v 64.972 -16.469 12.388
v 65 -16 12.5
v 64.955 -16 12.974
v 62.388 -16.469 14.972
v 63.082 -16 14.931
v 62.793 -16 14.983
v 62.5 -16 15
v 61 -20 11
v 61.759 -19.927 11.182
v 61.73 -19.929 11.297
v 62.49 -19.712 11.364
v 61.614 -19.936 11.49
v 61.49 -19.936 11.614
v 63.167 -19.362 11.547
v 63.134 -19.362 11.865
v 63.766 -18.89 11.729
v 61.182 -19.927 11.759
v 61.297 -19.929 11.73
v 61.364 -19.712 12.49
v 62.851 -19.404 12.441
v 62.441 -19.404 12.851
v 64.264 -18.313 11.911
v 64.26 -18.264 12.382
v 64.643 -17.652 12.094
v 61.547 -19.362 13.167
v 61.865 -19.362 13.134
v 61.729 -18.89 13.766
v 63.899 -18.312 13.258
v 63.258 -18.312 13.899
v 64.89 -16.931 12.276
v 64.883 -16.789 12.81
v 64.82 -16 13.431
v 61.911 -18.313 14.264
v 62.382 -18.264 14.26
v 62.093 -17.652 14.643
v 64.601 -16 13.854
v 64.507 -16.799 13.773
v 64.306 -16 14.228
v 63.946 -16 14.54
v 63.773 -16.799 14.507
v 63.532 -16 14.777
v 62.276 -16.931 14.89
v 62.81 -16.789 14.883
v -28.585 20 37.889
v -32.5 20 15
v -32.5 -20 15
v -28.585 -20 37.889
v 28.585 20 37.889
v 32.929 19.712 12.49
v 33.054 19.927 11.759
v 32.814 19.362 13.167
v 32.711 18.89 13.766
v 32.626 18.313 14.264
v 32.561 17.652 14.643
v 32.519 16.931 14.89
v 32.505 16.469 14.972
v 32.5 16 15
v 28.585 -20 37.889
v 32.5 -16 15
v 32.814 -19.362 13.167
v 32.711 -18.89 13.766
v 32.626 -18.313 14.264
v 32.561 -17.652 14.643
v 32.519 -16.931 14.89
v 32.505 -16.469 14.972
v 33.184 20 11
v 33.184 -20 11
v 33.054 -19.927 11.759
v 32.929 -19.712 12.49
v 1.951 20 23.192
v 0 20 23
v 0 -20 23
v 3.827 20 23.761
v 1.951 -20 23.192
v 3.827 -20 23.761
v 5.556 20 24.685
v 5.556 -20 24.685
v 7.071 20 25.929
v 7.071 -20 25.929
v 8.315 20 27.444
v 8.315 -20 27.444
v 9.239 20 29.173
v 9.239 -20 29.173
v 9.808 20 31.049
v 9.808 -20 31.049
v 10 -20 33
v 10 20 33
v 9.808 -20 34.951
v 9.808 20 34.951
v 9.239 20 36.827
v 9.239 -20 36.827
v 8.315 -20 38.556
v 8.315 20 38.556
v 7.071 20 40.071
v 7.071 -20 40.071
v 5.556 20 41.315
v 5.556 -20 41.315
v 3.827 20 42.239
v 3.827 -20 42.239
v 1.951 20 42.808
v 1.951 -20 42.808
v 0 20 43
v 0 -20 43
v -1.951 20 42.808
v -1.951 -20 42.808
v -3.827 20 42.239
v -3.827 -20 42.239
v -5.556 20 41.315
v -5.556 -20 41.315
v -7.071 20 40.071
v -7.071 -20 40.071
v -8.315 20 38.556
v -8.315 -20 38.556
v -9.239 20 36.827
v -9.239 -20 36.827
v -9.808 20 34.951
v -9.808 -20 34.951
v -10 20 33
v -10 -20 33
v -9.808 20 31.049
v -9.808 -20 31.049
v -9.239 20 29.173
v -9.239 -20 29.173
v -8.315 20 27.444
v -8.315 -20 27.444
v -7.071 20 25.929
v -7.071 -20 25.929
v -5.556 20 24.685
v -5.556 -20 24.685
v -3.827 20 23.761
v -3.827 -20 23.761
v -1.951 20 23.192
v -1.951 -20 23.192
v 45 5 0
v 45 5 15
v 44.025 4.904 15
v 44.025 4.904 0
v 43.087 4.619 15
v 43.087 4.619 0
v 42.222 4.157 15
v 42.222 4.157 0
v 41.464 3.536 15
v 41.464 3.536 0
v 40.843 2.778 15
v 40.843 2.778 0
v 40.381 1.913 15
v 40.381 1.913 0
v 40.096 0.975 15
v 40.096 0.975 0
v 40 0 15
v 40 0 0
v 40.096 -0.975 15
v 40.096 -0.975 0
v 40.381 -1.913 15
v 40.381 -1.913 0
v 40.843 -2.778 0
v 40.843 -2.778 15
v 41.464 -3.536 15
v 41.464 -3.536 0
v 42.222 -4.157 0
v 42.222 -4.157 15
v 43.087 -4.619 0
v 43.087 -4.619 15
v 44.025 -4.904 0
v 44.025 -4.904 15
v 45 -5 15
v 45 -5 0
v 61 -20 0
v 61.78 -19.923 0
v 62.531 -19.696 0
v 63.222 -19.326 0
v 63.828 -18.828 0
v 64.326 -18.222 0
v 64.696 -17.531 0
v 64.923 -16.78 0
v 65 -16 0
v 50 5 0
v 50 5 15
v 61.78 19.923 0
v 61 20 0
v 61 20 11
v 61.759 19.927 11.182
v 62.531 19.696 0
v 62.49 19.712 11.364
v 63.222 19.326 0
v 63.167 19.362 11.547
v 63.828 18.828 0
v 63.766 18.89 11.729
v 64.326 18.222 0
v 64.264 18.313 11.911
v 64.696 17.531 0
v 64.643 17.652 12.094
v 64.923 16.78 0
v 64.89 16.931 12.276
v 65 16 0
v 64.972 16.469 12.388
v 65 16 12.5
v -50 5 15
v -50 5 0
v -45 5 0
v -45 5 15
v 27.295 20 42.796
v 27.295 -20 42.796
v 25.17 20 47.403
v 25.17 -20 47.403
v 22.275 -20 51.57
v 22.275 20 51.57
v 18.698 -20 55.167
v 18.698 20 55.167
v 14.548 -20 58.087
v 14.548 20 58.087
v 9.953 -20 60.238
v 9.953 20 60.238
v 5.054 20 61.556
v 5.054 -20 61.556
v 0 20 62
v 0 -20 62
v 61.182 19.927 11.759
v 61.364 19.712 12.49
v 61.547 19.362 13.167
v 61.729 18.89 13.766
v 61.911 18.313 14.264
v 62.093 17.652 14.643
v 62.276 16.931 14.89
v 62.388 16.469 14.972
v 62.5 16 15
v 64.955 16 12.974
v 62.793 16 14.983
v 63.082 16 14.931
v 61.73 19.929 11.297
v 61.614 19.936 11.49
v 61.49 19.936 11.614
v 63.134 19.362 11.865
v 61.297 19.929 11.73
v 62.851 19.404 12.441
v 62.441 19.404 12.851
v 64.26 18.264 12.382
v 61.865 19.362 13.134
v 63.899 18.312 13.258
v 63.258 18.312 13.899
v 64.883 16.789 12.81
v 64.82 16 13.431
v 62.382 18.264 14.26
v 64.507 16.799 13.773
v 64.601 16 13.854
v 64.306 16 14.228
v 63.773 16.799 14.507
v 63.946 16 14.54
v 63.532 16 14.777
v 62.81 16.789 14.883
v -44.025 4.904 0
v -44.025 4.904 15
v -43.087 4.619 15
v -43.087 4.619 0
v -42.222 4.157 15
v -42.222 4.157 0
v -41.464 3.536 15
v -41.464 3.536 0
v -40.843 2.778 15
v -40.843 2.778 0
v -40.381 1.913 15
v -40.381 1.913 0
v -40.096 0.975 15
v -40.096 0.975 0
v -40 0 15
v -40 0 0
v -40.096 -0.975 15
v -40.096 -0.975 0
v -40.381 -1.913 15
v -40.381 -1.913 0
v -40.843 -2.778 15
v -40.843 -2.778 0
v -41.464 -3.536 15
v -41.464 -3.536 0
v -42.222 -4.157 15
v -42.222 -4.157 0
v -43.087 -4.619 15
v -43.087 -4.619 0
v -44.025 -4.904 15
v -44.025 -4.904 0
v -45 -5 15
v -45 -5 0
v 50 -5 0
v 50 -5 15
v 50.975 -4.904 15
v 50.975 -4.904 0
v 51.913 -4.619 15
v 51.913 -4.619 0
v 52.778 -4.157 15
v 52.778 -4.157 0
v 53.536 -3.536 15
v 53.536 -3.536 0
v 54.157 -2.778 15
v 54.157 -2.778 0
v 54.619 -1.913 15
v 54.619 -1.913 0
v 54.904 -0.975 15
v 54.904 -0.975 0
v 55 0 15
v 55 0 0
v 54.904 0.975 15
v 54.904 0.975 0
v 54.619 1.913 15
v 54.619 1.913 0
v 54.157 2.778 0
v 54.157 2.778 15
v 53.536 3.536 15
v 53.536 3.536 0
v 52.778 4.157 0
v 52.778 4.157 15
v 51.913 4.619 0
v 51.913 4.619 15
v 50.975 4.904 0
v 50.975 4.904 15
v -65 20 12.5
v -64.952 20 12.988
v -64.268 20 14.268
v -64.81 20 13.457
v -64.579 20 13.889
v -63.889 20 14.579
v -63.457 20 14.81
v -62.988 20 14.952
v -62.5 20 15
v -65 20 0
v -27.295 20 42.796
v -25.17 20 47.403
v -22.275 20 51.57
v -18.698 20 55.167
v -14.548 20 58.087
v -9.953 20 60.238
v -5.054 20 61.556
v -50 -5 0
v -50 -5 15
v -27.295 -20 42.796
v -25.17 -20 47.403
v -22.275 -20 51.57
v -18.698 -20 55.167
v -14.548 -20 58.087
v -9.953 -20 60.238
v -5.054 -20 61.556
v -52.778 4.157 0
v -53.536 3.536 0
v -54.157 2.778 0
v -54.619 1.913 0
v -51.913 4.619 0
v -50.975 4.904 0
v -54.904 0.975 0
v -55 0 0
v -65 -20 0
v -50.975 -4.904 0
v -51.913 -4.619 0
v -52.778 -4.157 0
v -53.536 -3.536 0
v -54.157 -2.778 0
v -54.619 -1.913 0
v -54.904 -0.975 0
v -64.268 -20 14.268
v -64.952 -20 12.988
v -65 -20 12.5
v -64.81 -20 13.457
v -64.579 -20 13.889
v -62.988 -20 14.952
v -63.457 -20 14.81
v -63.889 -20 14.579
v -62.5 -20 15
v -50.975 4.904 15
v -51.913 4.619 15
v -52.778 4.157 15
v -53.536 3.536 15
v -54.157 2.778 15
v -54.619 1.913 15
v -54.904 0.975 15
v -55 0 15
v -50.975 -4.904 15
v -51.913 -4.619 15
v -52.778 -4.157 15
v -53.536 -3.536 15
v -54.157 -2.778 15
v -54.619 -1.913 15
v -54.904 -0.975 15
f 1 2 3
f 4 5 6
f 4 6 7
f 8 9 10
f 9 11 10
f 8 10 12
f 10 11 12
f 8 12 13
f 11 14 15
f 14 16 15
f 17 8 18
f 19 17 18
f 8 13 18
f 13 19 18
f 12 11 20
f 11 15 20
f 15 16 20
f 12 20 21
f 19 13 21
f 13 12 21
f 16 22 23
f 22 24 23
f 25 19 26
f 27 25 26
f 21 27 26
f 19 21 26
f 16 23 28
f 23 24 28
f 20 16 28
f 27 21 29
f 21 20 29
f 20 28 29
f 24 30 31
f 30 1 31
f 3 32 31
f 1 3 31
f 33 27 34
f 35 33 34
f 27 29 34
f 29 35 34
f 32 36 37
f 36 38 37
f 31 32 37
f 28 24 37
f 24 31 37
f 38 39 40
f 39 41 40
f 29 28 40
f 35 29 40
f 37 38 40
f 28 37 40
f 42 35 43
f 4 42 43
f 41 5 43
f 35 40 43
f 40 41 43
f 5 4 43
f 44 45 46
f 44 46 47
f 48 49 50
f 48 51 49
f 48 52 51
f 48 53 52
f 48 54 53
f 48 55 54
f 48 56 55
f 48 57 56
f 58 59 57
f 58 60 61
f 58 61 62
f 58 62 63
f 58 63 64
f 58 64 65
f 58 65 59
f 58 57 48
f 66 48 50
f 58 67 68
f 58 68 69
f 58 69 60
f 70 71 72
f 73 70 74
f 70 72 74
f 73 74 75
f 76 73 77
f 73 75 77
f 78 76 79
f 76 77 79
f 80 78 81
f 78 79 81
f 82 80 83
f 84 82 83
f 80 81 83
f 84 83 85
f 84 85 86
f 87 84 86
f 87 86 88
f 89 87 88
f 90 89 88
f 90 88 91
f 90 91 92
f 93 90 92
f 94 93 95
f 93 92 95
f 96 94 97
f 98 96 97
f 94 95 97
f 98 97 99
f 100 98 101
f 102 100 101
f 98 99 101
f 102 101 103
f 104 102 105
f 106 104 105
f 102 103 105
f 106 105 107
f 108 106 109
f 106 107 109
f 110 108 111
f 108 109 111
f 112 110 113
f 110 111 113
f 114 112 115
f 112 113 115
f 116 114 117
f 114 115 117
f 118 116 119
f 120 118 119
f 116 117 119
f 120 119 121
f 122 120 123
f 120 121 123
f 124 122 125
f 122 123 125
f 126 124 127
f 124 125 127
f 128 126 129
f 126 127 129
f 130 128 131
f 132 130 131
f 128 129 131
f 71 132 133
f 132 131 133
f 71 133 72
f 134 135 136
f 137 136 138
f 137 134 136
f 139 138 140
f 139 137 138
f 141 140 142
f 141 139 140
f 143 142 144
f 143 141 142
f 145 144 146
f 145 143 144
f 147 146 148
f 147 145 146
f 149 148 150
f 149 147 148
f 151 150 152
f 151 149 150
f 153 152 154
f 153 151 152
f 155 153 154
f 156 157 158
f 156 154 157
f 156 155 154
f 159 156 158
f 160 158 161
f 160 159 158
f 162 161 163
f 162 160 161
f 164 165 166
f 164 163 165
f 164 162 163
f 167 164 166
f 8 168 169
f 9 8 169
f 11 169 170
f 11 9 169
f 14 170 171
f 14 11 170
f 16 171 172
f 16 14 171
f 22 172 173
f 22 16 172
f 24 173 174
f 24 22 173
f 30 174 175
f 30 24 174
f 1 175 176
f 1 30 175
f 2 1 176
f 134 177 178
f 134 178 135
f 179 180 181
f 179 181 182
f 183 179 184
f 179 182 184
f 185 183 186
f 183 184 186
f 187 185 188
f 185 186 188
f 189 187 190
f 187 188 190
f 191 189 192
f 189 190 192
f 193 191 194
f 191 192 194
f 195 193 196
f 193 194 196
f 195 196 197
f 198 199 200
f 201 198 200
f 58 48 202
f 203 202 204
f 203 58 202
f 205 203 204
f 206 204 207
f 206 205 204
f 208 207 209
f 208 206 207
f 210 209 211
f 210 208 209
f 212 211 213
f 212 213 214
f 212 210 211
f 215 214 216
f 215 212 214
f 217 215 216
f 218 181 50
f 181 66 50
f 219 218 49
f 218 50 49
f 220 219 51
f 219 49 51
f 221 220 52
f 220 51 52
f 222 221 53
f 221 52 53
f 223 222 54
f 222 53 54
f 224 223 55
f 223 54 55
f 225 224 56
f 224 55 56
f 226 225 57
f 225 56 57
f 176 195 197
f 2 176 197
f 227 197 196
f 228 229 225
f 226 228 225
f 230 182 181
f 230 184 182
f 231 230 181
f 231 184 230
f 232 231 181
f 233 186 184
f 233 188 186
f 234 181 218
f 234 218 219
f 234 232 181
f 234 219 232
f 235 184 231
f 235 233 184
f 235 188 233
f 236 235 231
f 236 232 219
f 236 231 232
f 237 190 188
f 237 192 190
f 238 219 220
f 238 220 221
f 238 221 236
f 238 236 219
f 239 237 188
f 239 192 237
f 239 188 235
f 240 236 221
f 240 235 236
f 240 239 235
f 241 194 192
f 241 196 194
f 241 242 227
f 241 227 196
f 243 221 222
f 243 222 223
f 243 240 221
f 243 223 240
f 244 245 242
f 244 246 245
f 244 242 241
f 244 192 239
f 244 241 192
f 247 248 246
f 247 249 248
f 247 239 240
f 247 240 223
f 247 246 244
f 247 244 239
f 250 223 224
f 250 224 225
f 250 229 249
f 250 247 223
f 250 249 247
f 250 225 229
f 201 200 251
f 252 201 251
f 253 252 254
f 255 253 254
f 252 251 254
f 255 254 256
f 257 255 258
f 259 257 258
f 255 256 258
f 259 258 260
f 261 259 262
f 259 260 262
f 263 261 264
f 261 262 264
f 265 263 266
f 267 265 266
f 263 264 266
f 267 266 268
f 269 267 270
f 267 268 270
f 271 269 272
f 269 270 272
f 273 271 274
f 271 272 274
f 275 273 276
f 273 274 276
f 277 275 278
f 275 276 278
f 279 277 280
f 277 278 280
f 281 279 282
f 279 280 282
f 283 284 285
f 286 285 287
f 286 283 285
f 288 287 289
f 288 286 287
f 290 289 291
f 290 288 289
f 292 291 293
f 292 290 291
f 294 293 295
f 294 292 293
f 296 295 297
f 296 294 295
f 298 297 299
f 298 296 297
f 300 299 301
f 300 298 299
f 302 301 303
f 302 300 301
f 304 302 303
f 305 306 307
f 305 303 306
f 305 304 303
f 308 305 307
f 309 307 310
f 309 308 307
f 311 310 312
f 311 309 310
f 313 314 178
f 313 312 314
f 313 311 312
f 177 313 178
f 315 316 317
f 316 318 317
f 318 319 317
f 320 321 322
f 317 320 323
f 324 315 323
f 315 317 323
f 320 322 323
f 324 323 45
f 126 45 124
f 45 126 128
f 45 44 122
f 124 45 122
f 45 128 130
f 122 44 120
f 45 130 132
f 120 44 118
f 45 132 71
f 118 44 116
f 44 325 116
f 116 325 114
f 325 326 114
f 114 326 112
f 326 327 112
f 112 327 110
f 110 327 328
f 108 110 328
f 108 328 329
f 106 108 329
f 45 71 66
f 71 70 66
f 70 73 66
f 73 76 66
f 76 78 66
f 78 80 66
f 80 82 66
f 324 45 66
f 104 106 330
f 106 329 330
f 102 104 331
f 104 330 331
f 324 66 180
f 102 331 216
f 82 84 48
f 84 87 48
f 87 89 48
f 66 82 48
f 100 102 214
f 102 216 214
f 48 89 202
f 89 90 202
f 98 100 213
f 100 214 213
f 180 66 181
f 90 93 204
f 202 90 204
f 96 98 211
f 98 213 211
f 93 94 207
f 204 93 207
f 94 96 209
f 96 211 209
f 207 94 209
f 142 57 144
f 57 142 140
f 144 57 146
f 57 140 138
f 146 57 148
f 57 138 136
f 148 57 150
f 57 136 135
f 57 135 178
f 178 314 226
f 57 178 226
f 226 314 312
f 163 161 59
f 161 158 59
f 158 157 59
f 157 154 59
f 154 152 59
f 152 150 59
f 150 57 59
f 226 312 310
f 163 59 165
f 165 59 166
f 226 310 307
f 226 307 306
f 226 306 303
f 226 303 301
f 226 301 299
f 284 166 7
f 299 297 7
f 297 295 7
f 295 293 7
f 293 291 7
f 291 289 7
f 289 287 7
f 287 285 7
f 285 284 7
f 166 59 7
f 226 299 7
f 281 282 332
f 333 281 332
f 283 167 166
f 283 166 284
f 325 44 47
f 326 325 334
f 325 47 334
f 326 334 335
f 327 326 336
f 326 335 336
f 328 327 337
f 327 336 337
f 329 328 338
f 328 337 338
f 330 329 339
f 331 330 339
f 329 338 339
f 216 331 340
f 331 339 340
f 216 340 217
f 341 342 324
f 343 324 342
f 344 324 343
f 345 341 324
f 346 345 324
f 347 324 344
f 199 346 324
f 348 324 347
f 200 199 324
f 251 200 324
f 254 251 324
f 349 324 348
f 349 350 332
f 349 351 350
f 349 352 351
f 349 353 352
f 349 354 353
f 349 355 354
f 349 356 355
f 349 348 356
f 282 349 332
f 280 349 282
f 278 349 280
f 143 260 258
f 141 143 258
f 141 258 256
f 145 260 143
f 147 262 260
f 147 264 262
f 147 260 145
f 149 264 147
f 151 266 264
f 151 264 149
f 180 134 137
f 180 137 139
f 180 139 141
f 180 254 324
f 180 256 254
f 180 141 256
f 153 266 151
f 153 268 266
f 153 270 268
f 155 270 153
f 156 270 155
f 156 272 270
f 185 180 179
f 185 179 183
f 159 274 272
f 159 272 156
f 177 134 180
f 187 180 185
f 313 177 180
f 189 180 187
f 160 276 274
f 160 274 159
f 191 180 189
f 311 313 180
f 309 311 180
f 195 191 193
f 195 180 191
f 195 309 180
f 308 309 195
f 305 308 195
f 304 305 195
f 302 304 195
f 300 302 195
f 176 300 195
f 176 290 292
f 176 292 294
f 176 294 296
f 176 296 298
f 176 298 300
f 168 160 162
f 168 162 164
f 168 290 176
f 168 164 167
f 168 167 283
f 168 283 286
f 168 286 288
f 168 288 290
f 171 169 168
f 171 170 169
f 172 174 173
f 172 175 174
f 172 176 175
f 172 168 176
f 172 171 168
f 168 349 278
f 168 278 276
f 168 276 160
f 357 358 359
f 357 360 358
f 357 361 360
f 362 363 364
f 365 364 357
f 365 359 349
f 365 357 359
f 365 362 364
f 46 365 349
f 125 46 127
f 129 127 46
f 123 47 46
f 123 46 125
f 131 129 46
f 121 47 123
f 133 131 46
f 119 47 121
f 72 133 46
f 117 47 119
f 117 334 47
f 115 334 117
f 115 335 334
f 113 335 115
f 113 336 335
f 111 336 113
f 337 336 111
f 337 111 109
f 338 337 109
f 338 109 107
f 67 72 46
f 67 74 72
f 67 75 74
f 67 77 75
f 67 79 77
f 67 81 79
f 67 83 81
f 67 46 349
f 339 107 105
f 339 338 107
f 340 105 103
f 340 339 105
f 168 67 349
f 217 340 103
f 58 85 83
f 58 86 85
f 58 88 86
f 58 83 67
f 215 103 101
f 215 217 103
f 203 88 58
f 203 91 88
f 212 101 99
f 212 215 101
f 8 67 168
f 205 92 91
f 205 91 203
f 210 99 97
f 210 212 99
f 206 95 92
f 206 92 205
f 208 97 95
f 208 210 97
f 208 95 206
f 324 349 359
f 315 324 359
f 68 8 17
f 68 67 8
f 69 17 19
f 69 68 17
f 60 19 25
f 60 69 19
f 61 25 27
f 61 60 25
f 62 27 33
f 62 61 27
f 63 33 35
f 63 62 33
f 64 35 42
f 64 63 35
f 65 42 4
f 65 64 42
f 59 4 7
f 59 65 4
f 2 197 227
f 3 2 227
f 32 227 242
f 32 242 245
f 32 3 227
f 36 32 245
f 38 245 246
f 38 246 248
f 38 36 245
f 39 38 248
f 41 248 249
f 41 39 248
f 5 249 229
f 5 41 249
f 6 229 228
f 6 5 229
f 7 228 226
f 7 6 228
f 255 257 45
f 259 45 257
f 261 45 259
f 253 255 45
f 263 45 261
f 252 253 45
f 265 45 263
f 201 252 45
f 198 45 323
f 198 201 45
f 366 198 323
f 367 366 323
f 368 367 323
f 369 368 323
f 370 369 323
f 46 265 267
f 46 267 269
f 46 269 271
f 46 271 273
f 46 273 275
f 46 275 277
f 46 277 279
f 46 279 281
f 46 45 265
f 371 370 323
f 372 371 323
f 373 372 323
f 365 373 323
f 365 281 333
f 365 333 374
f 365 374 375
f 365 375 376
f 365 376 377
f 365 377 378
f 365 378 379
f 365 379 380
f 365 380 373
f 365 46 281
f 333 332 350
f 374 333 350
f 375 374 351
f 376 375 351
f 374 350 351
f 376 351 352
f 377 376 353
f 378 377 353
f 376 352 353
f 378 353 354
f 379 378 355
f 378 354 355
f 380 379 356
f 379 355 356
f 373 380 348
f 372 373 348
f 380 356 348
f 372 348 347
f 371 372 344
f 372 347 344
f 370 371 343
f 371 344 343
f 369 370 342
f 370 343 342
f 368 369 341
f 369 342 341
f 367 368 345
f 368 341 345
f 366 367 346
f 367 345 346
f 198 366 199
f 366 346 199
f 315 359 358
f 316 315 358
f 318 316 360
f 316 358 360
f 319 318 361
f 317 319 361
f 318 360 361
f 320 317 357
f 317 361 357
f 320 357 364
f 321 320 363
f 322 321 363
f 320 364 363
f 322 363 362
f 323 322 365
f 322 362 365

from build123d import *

# Parameters (mm, degrees)
PAD_DEPTH    = 20
POCKET_DEPTH = 258.663147
FILLET_R     = 4


with BuildPart() as part:
    # Sketch → Pad (new body, symmetric)
    with BuildSketch(Plane.XZ):
        with BuildLine():
            Line((0, 23), (0, 0))
            Line((0, 0), (65, 0))
            Line((65, 0), (65, 12.5))
            ThreePointArc((65, 12.5), (64.267767, 14.267767), (62.5, 15))
            Line((47.5, 15), (62.5, 15))
            Line((32.5, 15), (47.5, 15))
            Line((32.5, 15), (28.584863, 37.889336))
            ThreePointArc((28.584863, 37.889336), (18.697717, 55.167439), (0, 62))
            Line((0, 43), (0, 62))
            ThreePointArc((0, 23), (10, 33), (0, 43))
        make_face()
    pad = extrude(amount=PAD_DEPTH, both=True)

    # Sketch001 → Pocket (cut, through all)
    with BuildSketch(Plane.XY):
        with BuildLine():
            ThreePointArc((45, 5), (40, 0), (45, -5))
            Line((45, -5), (50, -5))
            ThreePointArc((50, -5), (55, 0), (50, 5))
            Line((50, 5), (45, 5))
        make_face()
    pocket = extrude(amount=POCKET_DEPTH, mode=Mode.SUBTRACT)

    # Mirrored: Pad, Pocket across Sketch V_Axis
    add(pad.mirror(Plane(origin=(0, 0, 0), x_dir=(0, -1, 0), z_dir=(1, 0, 0))))
    add(pocket.mirror(Plane(origin=(0, 0, 0), x_dir=(0, -1, 0), z_dir=(1, 0, 0))), mode=Mode.SUBTRACT)

    # Fillet
    fillet_edges = [part.edges().sort_by_distance(p)[0] for p in [
        (65, -20, 6.25),
        (65, 20, 6.25),
    ]]
    fillet(fillet_edges, radius=FILLET_R)


solid = part.part
